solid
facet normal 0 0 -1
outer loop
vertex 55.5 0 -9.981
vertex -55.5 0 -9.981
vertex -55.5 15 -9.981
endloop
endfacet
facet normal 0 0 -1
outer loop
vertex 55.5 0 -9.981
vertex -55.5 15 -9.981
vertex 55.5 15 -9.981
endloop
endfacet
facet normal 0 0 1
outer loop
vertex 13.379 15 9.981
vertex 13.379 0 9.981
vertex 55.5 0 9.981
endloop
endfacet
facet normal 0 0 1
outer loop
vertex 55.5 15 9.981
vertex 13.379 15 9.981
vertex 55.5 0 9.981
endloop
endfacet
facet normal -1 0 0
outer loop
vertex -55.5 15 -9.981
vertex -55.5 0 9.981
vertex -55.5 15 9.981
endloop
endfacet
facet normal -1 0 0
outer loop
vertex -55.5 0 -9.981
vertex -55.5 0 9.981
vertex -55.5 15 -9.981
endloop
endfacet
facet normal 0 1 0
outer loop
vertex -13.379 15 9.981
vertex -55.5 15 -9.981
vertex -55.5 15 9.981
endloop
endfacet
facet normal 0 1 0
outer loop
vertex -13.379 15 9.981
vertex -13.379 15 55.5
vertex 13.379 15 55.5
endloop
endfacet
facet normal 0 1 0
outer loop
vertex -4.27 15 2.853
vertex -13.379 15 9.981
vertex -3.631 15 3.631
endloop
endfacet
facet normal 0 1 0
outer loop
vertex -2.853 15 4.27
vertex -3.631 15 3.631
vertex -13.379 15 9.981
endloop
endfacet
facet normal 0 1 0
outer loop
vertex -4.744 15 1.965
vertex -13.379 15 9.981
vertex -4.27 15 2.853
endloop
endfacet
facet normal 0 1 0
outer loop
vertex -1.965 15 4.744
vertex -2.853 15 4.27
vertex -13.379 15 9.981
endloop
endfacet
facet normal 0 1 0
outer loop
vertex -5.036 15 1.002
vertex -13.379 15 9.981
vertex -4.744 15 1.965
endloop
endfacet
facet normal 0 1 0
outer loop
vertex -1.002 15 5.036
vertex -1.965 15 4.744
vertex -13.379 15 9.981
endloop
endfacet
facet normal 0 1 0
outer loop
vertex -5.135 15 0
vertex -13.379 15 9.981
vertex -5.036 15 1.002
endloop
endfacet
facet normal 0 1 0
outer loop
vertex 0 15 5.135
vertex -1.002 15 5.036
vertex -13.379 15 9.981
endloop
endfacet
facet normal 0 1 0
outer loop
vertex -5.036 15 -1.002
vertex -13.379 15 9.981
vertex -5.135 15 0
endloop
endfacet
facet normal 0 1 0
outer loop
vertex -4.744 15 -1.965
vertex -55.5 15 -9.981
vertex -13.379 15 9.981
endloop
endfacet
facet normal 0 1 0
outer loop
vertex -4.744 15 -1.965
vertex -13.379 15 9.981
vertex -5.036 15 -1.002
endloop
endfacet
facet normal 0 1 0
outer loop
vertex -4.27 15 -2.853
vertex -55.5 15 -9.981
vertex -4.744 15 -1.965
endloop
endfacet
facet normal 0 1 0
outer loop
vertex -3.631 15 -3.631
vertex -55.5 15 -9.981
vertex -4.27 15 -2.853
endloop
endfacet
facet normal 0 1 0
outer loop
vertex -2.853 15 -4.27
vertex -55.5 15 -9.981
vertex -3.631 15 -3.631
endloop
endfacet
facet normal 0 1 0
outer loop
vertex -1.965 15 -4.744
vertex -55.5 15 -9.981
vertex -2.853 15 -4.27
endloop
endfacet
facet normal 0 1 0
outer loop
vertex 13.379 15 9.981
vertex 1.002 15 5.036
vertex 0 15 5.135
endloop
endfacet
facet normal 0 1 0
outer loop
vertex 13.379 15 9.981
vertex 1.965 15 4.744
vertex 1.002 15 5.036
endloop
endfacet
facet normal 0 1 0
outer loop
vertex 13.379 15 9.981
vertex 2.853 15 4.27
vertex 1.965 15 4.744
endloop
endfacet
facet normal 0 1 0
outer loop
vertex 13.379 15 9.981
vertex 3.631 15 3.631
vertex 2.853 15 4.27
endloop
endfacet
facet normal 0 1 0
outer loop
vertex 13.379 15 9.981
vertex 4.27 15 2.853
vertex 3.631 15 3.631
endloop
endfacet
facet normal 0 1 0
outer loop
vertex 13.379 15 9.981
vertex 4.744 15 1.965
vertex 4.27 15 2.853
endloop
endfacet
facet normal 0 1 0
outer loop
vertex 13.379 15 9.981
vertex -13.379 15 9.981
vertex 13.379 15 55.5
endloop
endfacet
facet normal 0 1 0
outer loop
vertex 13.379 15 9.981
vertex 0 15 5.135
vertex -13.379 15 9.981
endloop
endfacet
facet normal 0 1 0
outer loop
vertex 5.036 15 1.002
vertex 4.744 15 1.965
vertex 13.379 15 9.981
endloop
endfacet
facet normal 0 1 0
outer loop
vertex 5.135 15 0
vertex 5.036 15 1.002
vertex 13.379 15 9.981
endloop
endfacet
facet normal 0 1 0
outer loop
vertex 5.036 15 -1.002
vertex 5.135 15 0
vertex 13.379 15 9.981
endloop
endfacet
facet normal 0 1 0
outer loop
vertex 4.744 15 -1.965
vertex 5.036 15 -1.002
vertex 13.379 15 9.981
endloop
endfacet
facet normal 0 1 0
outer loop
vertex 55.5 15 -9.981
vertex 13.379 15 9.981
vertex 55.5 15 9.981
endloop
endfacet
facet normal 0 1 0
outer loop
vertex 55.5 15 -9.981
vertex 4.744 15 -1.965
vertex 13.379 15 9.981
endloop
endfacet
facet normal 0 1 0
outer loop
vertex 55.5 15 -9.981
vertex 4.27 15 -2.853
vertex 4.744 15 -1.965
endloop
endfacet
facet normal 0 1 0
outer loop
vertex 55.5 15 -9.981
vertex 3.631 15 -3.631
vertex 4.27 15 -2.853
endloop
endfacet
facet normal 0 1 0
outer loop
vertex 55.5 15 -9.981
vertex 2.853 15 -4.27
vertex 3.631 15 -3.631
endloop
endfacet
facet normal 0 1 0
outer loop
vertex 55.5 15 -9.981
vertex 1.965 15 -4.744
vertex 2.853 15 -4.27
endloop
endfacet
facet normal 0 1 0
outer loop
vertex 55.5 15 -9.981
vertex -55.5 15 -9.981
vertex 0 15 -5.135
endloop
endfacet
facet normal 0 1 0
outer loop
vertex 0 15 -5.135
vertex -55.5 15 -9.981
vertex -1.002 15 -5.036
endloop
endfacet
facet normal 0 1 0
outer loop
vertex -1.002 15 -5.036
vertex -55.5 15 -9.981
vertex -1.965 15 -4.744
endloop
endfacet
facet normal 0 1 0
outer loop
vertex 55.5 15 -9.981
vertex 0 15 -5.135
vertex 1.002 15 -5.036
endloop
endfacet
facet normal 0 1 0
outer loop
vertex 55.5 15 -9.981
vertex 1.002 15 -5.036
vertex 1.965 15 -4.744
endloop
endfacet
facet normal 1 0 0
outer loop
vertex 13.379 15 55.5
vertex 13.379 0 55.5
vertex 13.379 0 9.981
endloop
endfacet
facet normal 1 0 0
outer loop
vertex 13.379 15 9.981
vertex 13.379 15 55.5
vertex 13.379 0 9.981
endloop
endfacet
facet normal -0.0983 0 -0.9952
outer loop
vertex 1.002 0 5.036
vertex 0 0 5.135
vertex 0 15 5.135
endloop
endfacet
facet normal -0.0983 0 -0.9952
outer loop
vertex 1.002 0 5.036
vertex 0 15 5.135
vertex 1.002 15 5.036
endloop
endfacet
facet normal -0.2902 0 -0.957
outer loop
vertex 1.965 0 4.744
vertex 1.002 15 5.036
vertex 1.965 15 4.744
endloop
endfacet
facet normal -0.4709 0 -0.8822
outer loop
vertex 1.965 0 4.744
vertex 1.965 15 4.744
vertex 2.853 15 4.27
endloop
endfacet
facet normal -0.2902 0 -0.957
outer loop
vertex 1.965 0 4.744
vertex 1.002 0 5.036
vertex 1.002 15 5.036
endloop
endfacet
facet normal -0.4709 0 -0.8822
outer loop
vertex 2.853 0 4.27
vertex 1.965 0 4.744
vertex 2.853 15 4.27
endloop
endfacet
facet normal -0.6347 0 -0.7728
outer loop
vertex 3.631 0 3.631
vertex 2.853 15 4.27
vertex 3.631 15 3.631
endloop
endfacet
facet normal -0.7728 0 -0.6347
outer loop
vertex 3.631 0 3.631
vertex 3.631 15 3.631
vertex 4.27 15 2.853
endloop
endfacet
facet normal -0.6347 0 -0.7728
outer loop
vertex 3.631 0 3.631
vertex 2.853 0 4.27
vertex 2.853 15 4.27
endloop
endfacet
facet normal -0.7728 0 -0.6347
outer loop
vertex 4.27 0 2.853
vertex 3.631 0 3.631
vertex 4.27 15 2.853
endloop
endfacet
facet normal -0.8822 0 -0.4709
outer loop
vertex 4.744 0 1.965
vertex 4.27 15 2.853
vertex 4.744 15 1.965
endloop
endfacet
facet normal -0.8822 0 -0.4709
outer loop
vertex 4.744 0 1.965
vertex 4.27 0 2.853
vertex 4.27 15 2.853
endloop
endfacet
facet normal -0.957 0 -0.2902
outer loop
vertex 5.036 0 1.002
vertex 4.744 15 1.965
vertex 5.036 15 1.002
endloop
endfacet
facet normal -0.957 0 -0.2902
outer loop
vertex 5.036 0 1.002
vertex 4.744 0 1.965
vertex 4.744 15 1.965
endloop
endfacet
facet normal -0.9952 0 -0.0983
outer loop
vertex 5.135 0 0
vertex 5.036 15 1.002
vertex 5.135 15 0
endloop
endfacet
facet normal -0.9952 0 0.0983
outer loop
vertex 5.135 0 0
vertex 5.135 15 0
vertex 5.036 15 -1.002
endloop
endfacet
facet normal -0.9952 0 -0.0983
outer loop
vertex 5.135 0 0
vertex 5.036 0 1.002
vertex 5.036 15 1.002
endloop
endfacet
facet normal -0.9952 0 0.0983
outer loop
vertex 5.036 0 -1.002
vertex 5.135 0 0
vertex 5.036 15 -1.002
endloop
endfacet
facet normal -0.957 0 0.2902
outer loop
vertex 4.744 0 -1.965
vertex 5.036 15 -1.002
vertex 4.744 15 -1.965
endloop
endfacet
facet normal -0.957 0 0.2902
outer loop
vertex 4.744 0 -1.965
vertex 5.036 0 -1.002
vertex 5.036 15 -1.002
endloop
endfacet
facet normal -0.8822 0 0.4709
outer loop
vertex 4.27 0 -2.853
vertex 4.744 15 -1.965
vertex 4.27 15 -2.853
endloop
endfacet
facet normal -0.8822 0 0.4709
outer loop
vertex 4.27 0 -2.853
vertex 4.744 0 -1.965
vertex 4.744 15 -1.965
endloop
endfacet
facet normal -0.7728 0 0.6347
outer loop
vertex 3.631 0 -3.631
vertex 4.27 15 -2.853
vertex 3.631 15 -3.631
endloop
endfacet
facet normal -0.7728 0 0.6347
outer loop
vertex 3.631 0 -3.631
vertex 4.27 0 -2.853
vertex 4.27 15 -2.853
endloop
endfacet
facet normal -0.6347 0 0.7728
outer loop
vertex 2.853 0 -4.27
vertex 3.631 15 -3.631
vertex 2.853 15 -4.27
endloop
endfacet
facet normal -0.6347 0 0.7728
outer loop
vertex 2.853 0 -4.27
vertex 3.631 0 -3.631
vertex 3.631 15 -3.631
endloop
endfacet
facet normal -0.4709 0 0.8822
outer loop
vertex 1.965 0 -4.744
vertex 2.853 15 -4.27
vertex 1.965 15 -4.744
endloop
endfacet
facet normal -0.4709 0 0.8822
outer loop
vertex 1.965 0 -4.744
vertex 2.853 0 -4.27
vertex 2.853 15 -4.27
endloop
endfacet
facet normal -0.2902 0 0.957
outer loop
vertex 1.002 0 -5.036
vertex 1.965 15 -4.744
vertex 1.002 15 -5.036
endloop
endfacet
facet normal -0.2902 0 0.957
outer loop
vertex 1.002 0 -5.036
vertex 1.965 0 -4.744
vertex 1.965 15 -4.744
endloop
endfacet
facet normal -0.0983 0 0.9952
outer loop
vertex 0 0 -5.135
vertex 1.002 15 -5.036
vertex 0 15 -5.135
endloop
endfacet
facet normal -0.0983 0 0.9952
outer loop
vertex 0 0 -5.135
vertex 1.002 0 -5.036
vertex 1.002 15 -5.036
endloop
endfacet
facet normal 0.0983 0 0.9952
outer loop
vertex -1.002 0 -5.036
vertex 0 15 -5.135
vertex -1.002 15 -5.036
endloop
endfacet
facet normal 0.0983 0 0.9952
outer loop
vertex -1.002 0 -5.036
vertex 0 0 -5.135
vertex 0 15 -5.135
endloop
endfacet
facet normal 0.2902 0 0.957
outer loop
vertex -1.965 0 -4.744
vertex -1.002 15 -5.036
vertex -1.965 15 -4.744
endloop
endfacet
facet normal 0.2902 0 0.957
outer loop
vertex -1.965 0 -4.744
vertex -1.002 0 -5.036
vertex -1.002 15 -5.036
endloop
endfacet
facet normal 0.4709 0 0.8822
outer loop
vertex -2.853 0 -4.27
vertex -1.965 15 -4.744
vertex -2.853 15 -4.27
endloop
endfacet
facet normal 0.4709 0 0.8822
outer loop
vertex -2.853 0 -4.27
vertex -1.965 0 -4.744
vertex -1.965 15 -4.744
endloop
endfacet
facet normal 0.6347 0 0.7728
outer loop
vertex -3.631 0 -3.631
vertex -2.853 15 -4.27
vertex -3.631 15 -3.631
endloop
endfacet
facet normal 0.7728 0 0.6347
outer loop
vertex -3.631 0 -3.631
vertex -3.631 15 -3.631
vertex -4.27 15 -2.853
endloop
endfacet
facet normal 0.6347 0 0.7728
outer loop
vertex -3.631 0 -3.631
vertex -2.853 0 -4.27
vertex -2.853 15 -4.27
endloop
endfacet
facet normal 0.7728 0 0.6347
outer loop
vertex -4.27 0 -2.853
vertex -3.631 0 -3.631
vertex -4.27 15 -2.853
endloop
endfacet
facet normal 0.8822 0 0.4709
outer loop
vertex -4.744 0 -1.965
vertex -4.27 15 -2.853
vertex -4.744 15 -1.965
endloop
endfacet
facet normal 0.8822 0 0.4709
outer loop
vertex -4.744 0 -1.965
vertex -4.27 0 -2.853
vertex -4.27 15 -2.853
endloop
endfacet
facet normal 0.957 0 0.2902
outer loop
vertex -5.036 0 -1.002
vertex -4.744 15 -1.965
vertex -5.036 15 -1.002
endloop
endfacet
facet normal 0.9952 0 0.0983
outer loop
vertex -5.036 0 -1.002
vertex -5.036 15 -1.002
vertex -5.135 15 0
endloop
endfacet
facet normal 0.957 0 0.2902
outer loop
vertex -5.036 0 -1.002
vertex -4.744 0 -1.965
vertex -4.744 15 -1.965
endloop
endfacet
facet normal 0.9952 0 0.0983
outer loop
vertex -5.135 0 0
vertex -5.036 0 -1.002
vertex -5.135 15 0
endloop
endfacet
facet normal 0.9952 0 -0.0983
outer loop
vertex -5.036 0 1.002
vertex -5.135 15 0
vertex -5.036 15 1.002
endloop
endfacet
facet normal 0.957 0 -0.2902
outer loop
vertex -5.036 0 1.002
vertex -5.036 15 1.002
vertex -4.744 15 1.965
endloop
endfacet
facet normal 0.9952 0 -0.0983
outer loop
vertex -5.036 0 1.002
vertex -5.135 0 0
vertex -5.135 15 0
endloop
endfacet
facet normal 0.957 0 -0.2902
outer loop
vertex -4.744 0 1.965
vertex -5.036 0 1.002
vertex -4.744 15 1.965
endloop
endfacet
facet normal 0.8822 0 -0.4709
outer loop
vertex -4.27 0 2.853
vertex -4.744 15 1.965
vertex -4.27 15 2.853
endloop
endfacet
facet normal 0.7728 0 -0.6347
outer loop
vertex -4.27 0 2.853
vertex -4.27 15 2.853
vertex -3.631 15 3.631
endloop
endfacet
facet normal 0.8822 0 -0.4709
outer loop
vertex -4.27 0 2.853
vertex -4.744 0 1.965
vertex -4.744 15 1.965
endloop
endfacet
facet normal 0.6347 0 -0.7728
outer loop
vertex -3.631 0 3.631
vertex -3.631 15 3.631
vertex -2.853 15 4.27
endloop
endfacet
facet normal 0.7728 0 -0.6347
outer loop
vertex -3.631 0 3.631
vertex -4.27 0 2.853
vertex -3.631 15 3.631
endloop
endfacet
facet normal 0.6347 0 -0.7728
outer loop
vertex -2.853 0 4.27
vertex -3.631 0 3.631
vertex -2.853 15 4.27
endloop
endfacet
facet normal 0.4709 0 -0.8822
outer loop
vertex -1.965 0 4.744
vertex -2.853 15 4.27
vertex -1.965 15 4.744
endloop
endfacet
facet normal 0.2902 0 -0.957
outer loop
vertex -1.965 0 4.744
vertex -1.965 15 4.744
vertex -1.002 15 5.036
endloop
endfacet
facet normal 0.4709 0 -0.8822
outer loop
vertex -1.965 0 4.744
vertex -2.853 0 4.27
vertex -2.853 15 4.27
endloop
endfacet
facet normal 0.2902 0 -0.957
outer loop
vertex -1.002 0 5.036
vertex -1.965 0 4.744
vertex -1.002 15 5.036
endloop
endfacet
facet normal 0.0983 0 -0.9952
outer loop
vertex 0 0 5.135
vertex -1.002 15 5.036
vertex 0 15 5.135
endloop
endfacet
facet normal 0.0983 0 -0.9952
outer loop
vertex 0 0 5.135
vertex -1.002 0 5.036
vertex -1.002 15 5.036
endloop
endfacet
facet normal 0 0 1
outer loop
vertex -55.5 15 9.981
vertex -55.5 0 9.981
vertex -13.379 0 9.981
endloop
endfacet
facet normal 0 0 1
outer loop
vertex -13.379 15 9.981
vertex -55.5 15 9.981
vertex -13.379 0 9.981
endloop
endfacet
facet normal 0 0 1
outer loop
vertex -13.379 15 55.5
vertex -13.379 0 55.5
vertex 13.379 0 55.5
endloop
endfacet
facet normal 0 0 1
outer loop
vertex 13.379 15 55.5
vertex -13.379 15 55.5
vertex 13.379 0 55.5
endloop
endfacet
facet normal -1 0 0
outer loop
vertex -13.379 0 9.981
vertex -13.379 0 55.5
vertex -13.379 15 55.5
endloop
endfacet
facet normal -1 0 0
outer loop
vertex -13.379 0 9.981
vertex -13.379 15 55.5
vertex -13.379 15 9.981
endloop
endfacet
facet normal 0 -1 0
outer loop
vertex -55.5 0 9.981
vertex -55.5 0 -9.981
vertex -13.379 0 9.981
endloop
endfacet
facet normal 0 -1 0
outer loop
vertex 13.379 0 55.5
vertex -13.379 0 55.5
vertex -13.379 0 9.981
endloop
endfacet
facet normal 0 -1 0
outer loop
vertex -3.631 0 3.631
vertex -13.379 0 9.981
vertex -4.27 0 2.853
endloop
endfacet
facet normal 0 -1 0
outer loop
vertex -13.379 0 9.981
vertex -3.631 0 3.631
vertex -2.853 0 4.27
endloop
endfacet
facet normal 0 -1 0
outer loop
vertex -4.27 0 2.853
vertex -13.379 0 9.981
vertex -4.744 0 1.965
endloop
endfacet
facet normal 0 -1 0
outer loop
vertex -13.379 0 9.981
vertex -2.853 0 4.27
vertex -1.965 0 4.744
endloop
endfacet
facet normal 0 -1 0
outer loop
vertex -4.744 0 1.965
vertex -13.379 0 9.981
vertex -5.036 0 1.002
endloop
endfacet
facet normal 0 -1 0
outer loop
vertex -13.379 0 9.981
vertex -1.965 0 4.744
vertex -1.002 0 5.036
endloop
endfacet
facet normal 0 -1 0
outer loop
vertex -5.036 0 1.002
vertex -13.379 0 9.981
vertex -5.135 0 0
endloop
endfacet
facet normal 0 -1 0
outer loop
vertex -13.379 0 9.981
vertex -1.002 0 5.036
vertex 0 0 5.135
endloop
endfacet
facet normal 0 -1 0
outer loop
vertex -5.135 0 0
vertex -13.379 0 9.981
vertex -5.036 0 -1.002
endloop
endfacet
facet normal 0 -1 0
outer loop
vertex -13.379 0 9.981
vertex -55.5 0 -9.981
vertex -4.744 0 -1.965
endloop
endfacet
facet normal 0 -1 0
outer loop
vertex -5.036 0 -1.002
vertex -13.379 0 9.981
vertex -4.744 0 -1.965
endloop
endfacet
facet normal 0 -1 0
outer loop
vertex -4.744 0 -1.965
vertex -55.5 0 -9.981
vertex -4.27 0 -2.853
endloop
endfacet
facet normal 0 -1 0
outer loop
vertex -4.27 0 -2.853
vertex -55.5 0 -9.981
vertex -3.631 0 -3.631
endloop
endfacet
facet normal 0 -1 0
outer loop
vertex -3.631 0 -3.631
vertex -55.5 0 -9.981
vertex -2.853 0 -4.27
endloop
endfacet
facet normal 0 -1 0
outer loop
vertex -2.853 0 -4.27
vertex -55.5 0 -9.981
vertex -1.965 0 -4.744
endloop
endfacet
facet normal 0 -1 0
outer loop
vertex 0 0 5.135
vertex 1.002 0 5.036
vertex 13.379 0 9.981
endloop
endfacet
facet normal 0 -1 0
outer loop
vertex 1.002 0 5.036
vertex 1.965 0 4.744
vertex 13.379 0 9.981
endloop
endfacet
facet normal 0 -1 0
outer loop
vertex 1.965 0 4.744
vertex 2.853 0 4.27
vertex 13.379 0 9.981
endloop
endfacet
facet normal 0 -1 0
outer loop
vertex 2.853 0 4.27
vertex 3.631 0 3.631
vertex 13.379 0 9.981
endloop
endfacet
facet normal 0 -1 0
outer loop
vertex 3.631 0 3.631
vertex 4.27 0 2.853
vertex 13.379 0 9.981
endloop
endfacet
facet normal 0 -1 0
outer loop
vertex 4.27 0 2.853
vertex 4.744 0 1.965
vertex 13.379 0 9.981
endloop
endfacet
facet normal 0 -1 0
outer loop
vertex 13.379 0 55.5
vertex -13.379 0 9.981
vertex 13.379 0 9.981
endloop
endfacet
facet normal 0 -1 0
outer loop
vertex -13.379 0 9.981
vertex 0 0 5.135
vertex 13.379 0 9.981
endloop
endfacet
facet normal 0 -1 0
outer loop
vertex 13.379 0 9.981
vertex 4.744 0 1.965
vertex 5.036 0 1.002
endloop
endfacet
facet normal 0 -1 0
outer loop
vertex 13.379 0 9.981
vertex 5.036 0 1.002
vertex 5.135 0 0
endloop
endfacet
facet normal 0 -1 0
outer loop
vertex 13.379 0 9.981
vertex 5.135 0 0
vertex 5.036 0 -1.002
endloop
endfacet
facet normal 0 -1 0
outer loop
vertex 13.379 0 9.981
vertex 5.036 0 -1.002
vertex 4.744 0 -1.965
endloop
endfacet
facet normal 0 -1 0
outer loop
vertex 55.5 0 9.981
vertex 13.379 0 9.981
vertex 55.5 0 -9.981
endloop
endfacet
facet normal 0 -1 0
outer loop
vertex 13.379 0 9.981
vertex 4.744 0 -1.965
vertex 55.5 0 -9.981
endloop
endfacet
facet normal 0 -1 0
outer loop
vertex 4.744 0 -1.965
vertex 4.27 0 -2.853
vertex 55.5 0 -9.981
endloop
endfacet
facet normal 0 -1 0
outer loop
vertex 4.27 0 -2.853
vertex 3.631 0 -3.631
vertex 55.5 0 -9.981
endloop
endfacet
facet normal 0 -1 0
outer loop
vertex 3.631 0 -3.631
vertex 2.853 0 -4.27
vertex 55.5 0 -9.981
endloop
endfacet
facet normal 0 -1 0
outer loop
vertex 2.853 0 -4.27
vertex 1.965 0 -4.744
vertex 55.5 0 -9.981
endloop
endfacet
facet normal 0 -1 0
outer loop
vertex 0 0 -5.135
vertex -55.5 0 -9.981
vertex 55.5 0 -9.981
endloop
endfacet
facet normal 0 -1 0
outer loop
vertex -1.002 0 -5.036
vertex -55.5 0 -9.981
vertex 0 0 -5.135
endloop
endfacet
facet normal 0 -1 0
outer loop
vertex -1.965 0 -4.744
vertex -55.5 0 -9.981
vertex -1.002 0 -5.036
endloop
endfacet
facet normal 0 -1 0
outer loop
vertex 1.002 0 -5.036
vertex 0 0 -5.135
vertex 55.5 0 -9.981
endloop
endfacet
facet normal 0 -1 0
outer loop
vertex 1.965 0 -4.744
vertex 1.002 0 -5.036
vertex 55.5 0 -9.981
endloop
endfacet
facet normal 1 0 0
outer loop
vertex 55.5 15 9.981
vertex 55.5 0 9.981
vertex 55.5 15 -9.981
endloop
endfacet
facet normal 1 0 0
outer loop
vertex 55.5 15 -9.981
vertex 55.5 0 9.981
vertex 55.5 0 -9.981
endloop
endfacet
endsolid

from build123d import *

# Parameters (mm, degrees)
SKETCH2_W           = 111
SKETCH2_H           = 19.962120642
SKETCH2_R           = 5.135
SKETCH2_W_2         = 26.757359312
SKETCH2_H_2         = 45.518939679
BOSS_EXTRUDE1_DEPTH = 15


with BuildPart() as part:
    # Sketch2 → Boss-Extrude1 (new body)
    # profile 1 of 2: a face of its own
    with BuildSketch(Plane(origin=(0, 0, 0), x_dir=(1, 0, 0), z_dir=(0, 1, 0))):
        Rectangle(SKETCH2_W, SKETCH2_H)
        with Locations(Location((0, 0, 0), (0, 0, 270))):
            Circle(SKETCH2_R, mode=Mode.SUBTRACT)
    # profile 2 of 2: a face of its own
    with BuildSketch(Plane(origin=(0, 0, 0), x_dir=(1, 0, 0), z_dir=(0, 1, 0))):
        with Locations((0, -32.740530161)):
            Rectangle(SKETCH2_W_2, SKETCH2_H_2)
    extrude(amount=BOSS_EXTRUDE1_DEPTH)


solid = part.part
